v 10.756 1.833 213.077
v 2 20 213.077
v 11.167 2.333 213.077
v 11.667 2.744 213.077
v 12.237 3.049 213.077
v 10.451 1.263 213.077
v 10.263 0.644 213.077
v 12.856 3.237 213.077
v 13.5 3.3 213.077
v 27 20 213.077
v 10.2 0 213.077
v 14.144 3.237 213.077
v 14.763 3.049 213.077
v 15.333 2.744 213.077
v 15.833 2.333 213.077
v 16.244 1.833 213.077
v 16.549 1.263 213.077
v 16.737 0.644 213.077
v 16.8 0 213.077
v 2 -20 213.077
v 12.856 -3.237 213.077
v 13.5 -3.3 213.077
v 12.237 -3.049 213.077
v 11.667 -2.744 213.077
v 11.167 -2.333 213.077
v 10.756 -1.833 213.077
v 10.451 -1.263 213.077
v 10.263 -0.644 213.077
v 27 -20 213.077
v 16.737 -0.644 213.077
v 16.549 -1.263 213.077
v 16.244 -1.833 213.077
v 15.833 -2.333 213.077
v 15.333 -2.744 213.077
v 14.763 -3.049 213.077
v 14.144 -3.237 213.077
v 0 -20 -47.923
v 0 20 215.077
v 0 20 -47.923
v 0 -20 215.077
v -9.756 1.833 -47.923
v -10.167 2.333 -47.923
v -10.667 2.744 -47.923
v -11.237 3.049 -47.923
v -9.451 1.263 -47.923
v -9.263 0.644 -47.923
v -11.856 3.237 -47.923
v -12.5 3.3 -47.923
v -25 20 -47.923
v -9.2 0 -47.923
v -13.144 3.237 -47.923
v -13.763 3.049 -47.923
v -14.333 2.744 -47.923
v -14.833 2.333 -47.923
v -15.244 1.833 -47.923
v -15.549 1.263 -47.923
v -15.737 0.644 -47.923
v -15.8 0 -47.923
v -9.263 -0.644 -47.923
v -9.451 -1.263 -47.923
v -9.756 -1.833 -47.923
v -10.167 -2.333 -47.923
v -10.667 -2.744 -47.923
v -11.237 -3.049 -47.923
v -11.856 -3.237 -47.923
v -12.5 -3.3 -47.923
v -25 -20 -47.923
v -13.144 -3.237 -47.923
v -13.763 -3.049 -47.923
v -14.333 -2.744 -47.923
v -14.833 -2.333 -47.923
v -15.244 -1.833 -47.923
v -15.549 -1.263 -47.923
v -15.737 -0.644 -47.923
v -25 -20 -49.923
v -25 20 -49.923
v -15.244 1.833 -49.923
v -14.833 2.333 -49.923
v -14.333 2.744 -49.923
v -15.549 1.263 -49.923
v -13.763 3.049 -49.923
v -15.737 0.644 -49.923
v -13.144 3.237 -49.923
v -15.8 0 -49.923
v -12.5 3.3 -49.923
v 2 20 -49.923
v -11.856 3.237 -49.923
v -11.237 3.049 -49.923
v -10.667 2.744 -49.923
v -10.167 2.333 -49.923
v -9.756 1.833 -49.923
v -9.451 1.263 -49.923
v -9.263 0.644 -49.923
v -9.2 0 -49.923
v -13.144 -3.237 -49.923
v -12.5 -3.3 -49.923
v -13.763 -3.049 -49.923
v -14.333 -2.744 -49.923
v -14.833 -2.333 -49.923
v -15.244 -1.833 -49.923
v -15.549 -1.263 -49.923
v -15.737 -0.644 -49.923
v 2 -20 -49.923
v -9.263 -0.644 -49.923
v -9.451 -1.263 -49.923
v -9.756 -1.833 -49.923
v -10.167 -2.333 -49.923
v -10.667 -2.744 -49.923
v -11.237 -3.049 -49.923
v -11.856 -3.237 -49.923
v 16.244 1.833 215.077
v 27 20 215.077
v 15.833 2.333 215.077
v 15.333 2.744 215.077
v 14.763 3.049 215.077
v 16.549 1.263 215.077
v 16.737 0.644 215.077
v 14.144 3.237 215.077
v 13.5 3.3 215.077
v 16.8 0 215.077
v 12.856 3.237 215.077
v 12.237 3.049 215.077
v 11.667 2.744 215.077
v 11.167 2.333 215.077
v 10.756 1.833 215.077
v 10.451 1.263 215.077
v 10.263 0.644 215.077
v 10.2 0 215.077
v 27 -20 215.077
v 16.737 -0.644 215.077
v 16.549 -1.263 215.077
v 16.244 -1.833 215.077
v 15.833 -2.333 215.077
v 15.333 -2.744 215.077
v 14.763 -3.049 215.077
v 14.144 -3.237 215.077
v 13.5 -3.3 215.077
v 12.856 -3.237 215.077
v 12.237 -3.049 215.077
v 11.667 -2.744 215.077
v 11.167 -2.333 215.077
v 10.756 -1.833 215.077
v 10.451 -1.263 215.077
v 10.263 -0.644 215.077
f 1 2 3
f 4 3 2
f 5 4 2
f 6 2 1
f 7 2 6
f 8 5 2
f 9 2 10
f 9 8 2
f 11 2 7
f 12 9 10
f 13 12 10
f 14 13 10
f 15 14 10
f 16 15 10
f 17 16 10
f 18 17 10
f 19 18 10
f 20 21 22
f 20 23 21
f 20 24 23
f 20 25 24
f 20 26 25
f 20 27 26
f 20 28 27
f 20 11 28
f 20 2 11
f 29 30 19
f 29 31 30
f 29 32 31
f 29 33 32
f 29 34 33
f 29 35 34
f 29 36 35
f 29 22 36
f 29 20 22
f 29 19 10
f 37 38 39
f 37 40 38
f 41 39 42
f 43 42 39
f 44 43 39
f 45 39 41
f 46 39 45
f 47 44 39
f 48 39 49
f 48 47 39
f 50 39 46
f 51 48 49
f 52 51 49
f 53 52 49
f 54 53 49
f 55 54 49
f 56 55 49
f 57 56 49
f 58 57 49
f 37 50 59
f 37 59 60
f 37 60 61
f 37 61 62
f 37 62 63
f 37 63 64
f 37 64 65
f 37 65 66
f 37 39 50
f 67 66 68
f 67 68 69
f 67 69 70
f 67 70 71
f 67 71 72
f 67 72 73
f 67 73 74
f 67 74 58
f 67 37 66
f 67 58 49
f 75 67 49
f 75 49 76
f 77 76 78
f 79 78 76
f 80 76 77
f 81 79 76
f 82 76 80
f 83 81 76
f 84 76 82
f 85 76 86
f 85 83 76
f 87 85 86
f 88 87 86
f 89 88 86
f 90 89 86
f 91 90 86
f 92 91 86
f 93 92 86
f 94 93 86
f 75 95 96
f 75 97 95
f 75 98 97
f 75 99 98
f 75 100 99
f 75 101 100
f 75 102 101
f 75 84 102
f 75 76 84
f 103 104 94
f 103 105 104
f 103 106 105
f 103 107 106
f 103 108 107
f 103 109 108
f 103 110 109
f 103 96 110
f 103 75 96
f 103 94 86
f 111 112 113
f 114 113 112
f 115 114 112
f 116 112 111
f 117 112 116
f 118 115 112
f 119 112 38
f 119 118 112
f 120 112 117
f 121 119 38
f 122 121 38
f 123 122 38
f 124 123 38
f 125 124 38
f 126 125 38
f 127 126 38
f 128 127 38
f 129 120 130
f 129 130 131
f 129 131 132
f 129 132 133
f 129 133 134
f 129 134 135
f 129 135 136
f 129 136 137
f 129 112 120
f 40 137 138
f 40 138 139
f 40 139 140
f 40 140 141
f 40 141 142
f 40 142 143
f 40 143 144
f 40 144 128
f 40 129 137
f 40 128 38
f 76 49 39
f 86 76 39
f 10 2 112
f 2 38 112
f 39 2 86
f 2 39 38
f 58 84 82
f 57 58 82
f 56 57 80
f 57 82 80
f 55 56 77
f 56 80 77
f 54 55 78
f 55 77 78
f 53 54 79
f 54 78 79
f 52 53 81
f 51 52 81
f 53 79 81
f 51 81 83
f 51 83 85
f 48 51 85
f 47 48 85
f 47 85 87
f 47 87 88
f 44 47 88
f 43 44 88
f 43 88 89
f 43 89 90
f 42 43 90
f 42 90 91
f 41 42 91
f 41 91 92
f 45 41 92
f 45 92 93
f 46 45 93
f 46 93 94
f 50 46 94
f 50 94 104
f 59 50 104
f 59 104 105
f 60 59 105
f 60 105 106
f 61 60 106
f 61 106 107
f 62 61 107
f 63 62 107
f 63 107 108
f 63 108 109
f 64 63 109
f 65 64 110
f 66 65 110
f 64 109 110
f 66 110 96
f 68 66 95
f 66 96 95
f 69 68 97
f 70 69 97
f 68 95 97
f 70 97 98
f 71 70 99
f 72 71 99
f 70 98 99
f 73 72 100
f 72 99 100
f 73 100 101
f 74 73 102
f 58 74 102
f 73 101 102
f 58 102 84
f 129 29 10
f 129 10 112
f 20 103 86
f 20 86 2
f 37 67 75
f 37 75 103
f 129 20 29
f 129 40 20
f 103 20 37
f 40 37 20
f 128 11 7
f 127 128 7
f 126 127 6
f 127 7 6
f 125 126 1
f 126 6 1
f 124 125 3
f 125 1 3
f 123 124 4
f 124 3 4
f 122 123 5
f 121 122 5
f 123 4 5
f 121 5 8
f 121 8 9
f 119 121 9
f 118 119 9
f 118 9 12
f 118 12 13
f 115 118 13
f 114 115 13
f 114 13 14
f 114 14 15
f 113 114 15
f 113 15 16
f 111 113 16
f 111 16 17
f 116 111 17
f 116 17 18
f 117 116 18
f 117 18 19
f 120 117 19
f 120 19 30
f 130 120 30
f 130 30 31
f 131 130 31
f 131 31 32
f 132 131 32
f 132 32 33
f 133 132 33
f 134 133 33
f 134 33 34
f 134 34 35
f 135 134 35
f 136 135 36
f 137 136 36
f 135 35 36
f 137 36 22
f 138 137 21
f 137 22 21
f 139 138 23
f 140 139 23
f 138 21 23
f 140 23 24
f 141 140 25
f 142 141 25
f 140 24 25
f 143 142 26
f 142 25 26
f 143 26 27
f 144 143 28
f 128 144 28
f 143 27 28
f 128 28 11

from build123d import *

# Parameters (mm, degrees)
F1_DEPTH   = 20
F4_D       = 6.6
F4_ON_F3_D = 6.6


with BuildPart() as f1:
    # F0 (on Front) → F1 (new body, symmetric)
    with BuildSketch(Plane.XZ):
        Polygon((0, -47.9232184589), (-25, -47.9232184589), (-25, -49.9232184589), (2, -49.9232184589), (2, 213.0767815411), (27, 213.0767815411), (27, 215.0767815411), (0, 215.0767815411), align=None)
    extrude(amount=F1_DEPTH, both=True)

    # F4 (through all)
    with Locations(Plane.XY.offset(215.0767815411)):
        with Locations((13.5, 0)):
            Hole(F4_D / 2)

    # F4 on F3 (through all)
    with Locations(Plane.XY.offset(-47.9232184589)):
        with Locations((-12.5, 0)):
            Hole(F4_ON_F3_D / 2)


solid = f1.part
